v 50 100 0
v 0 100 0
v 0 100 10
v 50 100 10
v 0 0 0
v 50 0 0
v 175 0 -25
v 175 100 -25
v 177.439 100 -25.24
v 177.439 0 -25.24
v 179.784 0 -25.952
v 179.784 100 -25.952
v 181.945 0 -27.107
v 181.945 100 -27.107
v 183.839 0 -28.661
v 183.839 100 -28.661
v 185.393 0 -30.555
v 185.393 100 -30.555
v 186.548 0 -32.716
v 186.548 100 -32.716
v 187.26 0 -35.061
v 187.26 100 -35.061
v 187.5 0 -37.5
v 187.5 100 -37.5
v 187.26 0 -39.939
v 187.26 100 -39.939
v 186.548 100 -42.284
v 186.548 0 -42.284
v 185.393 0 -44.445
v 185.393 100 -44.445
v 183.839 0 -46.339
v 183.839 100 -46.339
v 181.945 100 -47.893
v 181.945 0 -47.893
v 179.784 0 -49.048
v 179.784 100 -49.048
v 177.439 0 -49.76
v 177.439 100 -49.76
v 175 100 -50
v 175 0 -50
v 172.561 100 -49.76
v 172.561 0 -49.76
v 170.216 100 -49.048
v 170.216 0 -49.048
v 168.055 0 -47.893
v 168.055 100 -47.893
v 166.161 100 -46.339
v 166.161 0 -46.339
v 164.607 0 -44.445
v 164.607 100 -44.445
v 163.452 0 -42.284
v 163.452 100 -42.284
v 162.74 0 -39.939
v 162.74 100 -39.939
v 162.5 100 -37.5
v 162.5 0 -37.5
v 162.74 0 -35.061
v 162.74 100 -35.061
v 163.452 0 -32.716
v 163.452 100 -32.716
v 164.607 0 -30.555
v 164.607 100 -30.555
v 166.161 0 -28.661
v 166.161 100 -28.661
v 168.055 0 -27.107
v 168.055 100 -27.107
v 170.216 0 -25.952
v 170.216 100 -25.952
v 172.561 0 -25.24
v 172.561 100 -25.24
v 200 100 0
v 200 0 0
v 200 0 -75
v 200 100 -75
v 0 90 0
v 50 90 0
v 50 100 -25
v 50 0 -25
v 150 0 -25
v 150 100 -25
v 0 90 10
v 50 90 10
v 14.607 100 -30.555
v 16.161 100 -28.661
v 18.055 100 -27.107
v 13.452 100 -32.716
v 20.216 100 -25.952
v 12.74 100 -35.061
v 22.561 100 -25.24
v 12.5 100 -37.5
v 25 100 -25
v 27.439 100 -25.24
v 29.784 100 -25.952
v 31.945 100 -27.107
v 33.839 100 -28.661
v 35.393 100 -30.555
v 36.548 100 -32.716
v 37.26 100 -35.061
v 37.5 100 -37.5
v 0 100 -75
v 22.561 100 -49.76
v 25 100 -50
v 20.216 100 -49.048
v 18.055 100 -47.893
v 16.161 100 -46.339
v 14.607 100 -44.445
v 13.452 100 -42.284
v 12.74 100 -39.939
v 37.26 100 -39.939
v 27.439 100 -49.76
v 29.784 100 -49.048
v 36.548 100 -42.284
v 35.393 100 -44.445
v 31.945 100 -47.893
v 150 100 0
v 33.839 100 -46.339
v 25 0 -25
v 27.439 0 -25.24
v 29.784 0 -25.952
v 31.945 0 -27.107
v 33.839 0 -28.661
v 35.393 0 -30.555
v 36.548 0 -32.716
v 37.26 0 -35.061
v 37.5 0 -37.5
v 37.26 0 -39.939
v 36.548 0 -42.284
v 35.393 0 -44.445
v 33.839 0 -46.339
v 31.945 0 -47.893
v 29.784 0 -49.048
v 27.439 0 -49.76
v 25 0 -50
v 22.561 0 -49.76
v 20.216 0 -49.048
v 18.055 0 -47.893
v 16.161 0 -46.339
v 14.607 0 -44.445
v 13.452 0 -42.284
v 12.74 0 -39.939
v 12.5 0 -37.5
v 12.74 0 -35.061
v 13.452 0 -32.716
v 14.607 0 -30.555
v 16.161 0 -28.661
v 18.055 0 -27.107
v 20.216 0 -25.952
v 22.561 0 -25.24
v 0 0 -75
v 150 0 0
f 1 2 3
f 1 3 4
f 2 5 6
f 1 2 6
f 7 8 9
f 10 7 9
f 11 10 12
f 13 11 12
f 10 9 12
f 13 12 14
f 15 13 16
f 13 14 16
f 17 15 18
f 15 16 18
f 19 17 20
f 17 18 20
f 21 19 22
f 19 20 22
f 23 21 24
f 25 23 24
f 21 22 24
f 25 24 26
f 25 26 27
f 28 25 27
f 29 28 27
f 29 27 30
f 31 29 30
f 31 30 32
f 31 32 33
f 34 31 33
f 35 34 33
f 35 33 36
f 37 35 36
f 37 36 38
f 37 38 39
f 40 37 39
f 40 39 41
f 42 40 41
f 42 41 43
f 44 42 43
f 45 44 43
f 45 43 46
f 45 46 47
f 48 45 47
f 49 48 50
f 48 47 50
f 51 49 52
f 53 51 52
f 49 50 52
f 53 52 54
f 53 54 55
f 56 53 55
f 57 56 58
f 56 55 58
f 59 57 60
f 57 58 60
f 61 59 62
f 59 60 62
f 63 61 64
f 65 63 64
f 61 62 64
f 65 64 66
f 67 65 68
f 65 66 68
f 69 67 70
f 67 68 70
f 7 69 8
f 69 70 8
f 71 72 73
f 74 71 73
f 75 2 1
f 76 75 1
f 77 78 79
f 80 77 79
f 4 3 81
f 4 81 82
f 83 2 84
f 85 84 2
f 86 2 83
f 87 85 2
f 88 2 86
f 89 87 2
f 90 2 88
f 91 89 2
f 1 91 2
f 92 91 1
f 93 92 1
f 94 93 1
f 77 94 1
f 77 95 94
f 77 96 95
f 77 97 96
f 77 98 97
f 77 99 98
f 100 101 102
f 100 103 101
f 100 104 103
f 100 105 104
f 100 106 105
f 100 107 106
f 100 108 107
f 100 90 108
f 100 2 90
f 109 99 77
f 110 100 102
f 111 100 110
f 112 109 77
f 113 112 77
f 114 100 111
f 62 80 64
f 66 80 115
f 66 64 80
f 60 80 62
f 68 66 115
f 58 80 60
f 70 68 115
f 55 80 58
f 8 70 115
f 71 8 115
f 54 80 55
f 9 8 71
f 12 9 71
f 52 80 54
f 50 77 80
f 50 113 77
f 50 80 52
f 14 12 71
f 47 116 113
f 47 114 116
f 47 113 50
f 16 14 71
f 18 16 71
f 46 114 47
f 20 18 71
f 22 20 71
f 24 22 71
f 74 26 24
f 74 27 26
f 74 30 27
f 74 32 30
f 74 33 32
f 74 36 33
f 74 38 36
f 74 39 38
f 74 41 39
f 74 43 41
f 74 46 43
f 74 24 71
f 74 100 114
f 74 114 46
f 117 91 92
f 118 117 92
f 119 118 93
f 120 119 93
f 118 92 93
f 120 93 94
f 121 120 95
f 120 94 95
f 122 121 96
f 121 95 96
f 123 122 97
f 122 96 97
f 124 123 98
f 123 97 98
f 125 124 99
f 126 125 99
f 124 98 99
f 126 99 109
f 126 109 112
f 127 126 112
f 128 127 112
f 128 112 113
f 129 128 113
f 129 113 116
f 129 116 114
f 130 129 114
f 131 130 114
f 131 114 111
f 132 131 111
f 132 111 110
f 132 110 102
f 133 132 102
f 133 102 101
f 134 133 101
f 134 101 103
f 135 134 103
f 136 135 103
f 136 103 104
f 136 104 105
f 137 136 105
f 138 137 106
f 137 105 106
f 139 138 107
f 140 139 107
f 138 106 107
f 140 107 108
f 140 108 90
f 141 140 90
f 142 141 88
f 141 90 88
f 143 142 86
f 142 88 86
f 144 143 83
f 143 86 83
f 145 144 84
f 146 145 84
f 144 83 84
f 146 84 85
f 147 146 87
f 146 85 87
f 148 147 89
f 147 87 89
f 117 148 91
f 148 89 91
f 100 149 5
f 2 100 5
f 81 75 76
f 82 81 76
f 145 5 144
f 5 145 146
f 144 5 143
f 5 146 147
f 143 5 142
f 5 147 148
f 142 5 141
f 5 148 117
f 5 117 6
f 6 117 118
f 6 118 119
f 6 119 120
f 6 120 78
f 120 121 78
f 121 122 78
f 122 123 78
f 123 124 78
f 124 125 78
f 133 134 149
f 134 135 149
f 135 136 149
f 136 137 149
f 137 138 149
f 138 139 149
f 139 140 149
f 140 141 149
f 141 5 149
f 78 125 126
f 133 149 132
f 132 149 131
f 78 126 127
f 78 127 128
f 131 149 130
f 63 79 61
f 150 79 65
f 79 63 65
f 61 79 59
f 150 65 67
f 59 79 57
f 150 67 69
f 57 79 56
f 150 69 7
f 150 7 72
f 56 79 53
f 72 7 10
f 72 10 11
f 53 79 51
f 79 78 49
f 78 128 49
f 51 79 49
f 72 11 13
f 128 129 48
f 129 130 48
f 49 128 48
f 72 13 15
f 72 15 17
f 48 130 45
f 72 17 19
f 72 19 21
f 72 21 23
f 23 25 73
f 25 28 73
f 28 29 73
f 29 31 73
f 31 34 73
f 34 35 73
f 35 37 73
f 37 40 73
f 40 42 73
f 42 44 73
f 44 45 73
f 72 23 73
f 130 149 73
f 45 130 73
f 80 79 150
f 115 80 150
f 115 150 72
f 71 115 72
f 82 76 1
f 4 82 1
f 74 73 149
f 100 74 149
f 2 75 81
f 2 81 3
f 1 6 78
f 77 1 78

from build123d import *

# Parameters (mm, degrees)
BOSS_EXTRUDE1_DEPTH = 100
HOLE1_D             = 25
SKETCH3_W           = 50
SKETCH3_H           = 10
BOSS_EXTRUDE2_DEPTH = 10


with BuildPart() as part:
    # Sketch1 → Boss-Extrude1 (new body)
    with BuildSketch(Plane(origin=(0, 0, 0), x_dir=(1, 0, 0), z_dir=(0, 1, 0))):
        Polygon((150, 0), (200, 0), (200, 75), (0, 75), (0, 0), (50, 0), (50, 25), (150, 25), align=None)
    extrude(amount=BOSS_EXTRUDE1_DEPTH)

    # Hole1 (through all)
    with Locations(Plane(origin=(175, 0, -37.5), x_dir=(0, 0, -1), z_dir=(0, -1, 0))):
        with Locations((0, 0), (0, -150)):
            Hole(HOLE1_D / 2)


with BuildPart() as body_2:
    # Sketch3 → Boss-Extrude2 (new body)
    with BuildSketch(Plane.XY):
        with Locations((25, 95)):
            Rectangle(SKETCH3_W, SKETCH3_H)
    extrude(amount=BOSS_EXTRUDE2_DEPTH)


solid = Compound([part.part, body_2.part])
